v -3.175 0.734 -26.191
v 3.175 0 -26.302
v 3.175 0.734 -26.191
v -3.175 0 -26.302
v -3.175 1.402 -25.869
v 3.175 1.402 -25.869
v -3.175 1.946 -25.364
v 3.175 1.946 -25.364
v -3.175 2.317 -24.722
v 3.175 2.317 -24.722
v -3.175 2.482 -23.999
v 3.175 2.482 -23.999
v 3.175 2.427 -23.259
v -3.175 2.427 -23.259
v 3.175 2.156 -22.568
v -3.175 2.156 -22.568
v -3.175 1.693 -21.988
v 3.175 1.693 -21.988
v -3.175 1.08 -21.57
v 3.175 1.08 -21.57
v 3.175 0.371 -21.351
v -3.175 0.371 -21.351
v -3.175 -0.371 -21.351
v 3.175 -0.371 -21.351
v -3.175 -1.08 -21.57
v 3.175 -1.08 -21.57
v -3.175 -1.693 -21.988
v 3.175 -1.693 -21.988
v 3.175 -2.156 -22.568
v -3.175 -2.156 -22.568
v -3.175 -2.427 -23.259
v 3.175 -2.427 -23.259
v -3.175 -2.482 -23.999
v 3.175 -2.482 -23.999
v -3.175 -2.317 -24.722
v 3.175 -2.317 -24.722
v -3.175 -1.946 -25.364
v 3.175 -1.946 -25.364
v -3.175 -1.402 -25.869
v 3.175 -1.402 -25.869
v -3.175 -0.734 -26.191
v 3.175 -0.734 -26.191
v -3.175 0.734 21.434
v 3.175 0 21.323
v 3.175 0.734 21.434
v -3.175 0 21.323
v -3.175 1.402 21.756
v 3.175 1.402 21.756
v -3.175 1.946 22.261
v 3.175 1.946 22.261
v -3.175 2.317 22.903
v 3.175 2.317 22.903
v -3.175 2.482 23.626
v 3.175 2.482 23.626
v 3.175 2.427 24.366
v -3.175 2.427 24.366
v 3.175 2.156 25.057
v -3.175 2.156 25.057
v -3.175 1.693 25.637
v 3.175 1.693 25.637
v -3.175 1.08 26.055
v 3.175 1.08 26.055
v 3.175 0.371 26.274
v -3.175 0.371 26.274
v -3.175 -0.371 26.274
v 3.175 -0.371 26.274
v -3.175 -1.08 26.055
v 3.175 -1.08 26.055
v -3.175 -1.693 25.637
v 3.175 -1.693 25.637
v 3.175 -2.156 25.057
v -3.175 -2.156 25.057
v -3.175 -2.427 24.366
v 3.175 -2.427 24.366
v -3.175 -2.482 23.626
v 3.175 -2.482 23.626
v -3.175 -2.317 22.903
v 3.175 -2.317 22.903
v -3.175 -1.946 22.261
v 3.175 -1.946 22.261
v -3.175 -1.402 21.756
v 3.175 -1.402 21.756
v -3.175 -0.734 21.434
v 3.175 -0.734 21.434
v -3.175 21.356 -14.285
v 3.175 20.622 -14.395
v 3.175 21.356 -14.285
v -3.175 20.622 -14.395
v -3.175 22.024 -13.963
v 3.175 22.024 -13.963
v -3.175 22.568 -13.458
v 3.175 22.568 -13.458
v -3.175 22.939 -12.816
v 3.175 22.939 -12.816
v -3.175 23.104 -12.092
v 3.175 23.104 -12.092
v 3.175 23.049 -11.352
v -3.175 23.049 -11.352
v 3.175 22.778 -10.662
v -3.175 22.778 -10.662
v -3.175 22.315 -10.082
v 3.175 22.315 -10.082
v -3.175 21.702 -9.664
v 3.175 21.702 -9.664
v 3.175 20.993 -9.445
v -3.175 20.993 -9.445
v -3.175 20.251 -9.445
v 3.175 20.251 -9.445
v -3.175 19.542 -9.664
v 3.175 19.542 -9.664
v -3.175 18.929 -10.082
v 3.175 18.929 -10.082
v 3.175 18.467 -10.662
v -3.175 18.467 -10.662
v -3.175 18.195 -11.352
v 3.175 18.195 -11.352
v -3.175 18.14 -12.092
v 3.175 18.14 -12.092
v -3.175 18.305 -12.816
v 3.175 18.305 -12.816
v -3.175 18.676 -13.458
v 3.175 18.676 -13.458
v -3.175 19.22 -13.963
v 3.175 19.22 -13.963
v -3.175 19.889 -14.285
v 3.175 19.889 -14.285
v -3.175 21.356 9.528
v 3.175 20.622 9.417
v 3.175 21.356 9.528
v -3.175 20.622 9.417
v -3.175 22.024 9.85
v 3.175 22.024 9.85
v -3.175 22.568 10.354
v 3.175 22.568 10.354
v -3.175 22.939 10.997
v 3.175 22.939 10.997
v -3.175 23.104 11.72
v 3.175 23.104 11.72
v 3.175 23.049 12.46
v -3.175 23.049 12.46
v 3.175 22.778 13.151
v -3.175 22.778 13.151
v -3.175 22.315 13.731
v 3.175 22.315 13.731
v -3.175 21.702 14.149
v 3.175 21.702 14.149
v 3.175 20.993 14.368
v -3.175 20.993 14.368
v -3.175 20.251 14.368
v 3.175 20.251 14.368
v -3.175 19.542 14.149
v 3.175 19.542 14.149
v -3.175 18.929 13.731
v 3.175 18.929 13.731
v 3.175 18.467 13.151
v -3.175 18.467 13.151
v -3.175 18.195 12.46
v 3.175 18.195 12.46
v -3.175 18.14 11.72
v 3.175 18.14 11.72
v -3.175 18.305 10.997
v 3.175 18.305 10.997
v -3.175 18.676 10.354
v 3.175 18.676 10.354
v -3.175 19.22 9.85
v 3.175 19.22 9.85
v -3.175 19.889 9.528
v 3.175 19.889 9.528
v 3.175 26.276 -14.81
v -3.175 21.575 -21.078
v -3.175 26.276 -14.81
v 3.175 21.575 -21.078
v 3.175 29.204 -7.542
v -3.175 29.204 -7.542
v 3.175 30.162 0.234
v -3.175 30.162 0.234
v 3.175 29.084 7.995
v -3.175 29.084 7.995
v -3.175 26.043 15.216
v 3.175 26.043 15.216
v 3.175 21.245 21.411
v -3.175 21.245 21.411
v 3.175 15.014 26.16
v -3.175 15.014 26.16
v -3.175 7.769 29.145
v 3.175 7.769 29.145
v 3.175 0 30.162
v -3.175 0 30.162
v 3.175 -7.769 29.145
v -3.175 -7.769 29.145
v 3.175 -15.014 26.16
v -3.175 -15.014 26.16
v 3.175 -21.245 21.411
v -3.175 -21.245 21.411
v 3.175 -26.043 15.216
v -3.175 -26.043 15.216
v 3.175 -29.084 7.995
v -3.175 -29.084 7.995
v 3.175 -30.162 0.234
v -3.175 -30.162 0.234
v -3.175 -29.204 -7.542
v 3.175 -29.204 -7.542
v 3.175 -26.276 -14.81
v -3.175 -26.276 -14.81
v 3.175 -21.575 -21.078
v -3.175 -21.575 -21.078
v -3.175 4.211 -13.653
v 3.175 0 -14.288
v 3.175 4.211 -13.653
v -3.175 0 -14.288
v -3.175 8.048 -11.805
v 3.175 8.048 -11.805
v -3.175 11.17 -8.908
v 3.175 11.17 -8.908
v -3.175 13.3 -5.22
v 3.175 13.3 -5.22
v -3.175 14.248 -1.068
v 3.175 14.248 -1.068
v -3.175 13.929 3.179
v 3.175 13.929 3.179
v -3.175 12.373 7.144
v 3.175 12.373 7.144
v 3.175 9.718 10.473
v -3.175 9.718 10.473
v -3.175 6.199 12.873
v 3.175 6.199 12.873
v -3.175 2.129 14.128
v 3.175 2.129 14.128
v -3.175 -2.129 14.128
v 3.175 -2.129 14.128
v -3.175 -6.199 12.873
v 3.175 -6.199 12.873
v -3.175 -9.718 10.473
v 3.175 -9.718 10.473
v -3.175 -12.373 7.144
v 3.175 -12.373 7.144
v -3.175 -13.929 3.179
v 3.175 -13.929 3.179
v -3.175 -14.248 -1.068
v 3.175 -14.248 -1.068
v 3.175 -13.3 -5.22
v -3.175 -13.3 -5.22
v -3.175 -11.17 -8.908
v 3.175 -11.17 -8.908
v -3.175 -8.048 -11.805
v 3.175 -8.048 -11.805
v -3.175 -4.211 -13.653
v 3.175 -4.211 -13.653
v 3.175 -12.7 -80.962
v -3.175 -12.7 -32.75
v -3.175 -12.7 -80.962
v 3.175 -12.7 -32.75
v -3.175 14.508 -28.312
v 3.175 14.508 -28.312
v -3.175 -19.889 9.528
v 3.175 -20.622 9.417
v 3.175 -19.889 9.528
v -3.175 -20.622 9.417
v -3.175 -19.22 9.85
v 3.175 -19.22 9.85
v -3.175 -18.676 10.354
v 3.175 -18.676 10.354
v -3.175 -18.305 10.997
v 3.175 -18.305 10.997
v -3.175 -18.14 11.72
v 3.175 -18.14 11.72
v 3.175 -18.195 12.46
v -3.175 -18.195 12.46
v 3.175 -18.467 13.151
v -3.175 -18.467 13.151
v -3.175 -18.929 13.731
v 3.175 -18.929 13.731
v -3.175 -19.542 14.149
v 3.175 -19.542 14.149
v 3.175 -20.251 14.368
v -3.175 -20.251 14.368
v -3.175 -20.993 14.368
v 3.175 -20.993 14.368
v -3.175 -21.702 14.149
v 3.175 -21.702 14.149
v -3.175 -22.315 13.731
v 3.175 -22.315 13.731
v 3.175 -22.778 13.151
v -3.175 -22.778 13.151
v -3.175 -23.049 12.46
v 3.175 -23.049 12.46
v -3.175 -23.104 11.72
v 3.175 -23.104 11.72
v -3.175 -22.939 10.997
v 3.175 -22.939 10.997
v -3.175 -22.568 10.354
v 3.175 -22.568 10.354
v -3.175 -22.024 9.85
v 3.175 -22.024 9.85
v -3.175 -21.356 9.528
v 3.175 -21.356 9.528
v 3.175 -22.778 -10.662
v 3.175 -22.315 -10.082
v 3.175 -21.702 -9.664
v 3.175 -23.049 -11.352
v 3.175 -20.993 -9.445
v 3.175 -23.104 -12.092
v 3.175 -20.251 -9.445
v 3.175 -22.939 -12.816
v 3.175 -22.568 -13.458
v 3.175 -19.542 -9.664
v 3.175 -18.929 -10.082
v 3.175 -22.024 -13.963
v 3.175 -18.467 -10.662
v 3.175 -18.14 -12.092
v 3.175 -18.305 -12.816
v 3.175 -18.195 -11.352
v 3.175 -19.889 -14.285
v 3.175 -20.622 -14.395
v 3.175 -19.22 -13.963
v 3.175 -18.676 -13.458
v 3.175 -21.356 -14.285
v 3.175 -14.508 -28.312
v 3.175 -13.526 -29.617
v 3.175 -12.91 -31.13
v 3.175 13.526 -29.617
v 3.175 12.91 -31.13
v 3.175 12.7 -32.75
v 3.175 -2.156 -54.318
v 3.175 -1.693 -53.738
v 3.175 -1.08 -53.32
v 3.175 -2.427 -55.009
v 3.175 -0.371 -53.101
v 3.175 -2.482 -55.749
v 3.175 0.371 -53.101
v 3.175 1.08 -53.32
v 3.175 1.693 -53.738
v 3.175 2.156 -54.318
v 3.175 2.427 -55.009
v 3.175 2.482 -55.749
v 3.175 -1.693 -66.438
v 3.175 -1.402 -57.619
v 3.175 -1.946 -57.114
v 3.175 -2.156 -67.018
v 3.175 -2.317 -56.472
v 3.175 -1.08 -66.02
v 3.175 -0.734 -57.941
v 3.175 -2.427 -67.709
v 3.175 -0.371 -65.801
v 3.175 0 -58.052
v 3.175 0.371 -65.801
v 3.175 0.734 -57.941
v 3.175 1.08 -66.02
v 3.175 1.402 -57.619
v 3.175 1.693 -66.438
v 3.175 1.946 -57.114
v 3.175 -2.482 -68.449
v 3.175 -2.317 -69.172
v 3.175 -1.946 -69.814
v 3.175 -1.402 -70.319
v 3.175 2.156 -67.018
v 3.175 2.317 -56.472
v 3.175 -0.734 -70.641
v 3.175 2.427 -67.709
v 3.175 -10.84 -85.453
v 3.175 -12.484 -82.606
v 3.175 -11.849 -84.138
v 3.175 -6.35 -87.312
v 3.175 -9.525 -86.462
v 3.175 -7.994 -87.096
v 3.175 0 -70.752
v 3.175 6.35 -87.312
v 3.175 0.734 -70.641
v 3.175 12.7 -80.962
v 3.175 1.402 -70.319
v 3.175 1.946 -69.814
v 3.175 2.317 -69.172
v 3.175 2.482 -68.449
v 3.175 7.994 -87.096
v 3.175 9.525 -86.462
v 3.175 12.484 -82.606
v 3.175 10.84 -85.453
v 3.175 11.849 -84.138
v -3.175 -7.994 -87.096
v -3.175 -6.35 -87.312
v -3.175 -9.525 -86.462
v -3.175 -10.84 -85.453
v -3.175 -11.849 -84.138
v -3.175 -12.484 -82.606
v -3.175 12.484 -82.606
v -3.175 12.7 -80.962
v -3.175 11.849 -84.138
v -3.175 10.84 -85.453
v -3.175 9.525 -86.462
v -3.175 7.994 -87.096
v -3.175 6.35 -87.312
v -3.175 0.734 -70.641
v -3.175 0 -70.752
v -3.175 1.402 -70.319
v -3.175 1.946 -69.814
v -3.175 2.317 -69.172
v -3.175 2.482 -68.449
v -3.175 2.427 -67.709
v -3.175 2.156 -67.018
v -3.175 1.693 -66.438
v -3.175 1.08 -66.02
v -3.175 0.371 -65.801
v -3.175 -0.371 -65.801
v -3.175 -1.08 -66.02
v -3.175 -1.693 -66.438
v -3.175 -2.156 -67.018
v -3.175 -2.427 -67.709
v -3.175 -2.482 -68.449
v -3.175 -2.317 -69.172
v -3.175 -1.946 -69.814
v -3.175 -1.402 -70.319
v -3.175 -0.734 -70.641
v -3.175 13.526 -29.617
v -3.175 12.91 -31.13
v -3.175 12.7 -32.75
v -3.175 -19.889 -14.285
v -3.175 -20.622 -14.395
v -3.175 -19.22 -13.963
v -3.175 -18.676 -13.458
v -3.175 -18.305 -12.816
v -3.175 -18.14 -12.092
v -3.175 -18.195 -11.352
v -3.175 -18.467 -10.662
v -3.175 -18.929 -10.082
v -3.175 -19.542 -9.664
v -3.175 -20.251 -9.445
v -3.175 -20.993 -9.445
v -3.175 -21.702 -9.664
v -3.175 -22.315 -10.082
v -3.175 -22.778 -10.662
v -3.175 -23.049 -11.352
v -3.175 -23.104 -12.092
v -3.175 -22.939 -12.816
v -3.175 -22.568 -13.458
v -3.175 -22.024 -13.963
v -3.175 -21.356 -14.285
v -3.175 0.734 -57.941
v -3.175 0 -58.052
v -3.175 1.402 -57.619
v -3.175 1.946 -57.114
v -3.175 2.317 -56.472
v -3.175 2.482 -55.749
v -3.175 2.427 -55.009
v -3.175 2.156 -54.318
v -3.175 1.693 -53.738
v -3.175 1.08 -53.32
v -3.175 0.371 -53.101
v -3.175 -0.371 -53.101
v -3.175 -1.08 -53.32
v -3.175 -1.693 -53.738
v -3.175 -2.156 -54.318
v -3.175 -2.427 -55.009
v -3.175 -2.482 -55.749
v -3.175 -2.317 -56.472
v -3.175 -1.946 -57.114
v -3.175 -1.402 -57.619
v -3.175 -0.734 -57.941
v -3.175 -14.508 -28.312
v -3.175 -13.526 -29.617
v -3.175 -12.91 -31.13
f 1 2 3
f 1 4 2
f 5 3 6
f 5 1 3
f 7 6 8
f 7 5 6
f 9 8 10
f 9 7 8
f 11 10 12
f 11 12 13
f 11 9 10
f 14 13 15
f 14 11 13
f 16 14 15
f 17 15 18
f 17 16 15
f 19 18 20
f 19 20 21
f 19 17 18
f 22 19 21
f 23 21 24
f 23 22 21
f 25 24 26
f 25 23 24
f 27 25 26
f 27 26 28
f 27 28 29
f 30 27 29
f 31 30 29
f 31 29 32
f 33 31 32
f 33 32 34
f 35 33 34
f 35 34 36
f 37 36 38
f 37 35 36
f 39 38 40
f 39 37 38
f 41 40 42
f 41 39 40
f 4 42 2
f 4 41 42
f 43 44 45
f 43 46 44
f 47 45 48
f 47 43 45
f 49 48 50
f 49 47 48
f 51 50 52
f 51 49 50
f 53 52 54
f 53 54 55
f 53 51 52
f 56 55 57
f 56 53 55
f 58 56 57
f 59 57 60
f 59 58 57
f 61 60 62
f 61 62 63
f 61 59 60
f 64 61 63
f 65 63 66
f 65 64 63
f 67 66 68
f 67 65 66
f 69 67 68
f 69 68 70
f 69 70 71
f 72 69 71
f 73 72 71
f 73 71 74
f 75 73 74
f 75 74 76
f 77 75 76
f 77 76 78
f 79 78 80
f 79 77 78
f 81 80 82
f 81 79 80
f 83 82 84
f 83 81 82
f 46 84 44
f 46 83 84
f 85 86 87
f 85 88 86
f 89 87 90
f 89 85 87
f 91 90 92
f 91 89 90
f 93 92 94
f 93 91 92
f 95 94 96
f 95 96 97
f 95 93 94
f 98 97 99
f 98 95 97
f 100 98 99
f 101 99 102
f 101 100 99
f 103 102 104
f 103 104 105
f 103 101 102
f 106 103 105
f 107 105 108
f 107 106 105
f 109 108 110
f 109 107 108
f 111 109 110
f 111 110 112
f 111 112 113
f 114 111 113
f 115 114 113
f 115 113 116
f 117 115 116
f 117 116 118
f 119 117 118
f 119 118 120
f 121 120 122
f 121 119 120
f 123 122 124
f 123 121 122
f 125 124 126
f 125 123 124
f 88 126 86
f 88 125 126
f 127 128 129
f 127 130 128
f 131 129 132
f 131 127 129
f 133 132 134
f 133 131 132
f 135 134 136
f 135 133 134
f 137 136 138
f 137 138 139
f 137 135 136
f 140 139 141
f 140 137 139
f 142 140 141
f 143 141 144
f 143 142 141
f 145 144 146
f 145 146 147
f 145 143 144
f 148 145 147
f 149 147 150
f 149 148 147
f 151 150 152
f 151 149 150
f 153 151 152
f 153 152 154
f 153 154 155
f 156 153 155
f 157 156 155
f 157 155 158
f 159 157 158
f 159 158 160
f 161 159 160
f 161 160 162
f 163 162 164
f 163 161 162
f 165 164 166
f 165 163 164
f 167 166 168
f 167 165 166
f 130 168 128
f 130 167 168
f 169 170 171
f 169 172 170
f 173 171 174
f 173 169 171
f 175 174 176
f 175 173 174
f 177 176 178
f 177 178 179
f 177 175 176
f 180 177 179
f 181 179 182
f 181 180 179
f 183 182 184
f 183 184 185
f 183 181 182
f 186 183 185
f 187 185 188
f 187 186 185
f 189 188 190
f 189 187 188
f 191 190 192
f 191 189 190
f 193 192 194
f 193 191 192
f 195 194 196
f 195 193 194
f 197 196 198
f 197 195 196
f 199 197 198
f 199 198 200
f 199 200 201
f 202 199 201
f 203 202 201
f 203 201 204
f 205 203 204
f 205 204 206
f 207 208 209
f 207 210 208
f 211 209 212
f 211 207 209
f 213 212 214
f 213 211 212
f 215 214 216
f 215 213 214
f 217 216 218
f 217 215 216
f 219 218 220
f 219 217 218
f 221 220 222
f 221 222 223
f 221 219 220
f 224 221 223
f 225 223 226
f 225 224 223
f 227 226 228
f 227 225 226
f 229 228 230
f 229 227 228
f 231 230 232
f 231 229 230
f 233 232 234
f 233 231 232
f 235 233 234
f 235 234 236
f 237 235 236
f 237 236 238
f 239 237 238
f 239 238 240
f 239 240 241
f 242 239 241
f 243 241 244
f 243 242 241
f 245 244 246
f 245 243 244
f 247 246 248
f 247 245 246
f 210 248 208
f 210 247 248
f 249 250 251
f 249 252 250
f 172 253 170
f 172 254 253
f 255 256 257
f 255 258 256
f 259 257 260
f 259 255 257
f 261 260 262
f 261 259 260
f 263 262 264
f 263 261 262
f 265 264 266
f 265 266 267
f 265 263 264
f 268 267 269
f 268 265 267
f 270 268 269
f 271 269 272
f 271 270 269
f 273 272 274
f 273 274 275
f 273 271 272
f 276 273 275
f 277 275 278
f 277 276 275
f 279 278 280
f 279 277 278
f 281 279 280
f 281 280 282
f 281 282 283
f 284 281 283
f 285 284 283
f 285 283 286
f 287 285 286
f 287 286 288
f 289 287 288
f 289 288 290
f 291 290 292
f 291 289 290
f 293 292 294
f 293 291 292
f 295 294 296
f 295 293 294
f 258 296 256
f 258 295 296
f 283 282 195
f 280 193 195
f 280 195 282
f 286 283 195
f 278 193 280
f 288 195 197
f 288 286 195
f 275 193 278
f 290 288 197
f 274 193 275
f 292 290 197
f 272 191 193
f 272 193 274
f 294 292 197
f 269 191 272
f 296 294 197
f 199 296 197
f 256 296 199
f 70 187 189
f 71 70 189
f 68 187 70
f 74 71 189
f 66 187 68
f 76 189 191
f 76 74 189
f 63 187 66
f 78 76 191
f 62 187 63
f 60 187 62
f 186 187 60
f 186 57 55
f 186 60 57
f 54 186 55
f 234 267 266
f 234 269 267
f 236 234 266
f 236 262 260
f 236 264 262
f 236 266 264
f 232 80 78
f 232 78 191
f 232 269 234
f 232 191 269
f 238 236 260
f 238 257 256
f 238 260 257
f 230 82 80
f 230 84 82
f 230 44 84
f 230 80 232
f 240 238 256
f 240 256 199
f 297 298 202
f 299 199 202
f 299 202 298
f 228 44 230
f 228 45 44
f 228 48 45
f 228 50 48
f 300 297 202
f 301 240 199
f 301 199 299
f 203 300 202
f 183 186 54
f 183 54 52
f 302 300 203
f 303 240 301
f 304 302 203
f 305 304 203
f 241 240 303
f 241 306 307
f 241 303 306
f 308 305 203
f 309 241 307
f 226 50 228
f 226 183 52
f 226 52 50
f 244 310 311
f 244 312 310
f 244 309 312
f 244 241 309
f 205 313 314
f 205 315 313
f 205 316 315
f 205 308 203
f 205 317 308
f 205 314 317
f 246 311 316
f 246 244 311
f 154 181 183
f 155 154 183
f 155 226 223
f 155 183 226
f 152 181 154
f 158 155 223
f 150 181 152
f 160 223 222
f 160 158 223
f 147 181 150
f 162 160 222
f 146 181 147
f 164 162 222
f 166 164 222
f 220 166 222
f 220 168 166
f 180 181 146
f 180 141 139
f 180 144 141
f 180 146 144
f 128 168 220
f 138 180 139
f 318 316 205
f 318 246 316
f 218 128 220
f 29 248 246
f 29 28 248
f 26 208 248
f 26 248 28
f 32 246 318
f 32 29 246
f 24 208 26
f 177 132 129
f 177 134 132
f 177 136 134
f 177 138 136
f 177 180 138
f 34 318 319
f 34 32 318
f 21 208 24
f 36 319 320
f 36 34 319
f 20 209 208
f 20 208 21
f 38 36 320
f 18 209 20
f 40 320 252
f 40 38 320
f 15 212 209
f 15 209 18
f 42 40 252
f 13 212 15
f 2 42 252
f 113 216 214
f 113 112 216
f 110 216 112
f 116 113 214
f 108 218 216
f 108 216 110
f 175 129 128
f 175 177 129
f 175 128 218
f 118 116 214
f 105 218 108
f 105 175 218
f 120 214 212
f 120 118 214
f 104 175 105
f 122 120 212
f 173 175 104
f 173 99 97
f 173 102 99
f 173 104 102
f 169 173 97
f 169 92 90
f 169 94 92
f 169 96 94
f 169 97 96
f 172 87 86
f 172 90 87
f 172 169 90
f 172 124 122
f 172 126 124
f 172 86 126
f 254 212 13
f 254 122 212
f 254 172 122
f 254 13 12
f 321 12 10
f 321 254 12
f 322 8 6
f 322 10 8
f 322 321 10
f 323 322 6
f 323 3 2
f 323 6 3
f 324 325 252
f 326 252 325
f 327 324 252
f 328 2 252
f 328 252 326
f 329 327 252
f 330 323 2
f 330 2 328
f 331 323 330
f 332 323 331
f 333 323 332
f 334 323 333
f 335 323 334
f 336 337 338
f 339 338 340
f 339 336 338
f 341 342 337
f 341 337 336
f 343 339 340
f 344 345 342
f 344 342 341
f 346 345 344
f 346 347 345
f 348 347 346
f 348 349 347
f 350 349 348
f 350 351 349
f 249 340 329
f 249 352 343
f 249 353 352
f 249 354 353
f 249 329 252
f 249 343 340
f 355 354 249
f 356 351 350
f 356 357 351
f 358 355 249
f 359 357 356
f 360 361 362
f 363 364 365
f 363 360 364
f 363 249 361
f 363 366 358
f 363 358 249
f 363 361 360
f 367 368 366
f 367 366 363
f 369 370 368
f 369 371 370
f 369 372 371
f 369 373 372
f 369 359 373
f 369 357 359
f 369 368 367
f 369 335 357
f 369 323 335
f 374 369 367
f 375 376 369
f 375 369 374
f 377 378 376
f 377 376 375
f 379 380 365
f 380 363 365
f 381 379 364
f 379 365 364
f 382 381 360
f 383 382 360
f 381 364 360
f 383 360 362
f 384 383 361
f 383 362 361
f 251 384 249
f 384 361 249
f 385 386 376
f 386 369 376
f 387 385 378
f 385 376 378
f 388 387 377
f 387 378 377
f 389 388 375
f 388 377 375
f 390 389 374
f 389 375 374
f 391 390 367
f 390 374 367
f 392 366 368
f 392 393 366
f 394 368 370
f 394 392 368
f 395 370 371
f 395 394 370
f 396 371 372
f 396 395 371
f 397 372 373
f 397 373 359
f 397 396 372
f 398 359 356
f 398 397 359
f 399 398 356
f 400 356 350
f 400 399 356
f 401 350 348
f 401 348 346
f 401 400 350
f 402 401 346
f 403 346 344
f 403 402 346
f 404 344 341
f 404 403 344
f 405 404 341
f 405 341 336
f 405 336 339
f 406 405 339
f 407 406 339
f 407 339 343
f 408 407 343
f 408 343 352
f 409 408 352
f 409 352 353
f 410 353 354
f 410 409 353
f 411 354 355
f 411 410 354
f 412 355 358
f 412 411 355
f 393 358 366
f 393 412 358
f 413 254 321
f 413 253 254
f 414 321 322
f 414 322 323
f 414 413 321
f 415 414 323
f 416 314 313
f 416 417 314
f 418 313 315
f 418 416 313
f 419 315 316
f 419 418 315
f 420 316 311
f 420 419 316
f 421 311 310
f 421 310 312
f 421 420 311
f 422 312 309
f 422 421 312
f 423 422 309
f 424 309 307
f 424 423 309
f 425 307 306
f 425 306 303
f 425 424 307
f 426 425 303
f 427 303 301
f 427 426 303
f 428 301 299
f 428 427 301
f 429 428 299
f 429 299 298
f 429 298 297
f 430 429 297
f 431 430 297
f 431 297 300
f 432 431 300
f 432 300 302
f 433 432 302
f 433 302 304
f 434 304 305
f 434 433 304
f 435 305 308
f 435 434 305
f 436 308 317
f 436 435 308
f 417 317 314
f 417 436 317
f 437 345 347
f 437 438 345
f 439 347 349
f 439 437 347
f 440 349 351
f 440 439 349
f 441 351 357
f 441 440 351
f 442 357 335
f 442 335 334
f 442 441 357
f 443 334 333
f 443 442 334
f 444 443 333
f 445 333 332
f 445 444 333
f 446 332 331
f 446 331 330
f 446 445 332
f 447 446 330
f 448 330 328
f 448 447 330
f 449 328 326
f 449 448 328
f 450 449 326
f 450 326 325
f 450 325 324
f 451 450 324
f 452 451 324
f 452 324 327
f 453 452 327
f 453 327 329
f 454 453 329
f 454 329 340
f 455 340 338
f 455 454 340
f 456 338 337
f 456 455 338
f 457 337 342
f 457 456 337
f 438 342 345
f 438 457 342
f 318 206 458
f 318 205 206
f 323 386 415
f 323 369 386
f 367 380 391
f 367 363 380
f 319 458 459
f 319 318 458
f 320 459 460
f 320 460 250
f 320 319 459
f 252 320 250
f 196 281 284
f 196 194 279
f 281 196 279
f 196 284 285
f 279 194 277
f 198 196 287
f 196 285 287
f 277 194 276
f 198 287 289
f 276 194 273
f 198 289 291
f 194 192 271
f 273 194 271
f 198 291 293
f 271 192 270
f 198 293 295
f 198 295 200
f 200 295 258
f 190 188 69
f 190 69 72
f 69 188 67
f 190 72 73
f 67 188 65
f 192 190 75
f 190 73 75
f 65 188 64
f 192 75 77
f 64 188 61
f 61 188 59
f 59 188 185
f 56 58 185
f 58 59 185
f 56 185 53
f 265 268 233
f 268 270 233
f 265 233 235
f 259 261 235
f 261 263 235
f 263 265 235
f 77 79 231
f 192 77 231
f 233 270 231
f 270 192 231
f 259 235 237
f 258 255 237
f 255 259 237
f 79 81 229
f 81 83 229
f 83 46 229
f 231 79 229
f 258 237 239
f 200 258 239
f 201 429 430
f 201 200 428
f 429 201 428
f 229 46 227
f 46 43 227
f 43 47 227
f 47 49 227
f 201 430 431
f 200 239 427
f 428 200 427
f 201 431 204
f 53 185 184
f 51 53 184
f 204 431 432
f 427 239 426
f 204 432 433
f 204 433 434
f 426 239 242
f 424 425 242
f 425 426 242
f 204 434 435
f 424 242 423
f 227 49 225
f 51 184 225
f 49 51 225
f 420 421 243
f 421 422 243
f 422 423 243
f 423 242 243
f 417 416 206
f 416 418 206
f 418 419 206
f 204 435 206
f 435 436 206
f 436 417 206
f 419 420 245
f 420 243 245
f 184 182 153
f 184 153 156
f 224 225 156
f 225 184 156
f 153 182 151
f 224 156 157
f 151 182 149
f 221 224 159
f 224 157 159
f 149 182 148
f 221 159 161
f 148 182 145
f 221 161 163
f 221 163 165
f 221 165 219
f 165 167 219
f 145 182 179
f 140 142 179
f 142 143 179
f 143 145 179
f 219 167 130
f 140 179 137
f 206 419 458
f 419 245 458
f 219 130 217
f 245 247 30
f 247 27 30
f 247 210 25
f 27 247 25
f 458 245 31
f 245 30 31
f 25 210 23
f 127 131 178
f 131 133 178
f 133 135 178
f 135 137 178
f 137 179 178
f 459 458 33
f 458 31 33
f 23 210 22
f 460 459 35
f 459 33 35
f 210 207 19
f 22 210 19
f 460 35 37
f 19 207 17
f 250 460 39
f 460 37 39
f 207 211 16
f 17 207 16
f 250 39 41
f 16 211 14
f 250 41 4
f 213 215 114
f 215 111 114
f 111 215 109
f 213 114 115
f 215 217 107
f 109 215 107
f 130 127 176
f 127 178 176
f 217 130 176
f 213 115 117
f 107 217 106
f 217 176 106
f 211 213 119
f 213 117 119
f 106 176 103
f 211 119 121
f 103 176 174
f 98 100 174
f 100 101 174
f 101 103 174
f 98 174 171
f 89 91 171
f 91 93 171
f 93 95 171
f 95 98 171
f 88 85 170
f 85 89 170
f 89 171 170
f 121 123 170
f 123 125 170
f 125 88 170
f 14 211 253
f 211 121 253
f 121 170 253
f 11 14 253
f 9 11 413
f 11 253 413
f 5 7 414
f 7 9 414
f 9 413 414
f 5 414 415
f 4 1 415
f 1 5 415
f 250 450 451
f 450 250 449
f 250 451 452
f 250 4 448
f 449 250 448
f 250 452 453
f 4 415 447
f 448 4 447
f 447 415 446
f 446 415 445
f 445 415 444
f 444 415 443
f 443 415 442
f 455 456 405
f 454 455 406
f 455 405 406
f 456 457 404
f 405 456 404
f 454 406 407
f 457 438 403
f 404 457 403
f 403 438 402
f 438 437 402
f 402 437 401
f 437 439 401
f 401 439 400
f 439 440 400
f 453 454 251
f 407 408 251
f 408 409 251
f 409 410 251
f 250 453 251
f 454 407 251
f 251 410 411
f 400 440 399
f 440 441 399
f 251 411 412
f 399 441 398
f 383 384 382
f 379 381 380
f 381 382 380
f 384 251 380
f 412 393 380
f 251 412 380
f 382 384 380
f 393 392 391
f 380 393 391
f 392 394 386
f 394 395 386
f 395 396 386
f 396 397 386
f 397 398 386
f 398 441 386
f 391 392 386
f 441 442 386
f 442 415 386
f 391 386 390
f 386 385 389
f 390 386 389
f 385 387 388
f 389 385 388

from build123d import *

# Parameters (mm, degrees)
SKETCH1_R           = 2.4892
SKETCH1_R_2         = 14.2875
BOSS_EXTRUDE1_DEPTH = 3.175
FILLET1_R           = 6.35


with BuildPart() as part:
    # Sketch1 → Boss-Extrude1 (new, symmetric)
    with BuildSketch(Plane(origin=(0, 0, 0), x_dir=(0, 0, -1), z_dir=(1, 0, 0))):
        with BuildLine():
            Line((21.078264706, -21.575058824), (30.1625, -12.7))
            Line((30.1625, -12.7), (87.3125, -12.7))
            Line((87.3125, -12.7), (87.3125, 12.7))
            Line((87.3125, 12.7), (30.1625, 12.7))
            Line((30.1625, 12.7), (21.078264706, 21.575058824))
            ThreePointArc((21.078264706, 21.575058824), (-30.1625, 0), (21.078264706, -21.575058824))
        make_face()
        with Locations((55.5625, 0)):
            Circle(SKETCH1_R, mode=Mode.SUBTRACT)
        with Locations((68.2625, 0)):
            Circle(SKETCH1_R, mode=Mode.SUBTRACT)
        with Locations((-11.90625, 20.622229928)):
            Circle(SKETCH1_R, mode=Mode.SUBTRACT)
        with Locations((11.90625, 20.622229928)):
            Circle(SKETCH1_R, mode=Mode.SUBTRACT)
        with Locations((-11.90625, -20.622229928)):
            Circle(SKETCH1_R, mode=Mode.SUBTRACT)
        with Locations((11.90625, -20.622229928)):
            Circle(SKETCH1_R, mode=Mode.SUBTRACT)
        with Locations((-23.8125, 0)):
            Circle(SKETCH1_R, mode=Mode.SUBTRACT)
        Circle(SKETCH1_R_2, mode=Mode.SUBTRACT)
        with Locations((23.8125, 0)):
            Circle(SKETCH1_R, mode=Mode.SUBTRACT)
    extrude(amount=BOSS_EXTRUDE1_DEPTH, both=True)

    # Fillet1
    fillet1_edges = [part.edges().sort_by_distance(p)[0] for p in [
        (0, 12.7, -30.1625),
        (0, 12.7, -87.3125),
        (0, -12.7, -87.3125),
        (0, -12.7, -30.1625),
    ]]
    fillet(fillet1_edges, radius=FILLET1_R)


solid = part.part
